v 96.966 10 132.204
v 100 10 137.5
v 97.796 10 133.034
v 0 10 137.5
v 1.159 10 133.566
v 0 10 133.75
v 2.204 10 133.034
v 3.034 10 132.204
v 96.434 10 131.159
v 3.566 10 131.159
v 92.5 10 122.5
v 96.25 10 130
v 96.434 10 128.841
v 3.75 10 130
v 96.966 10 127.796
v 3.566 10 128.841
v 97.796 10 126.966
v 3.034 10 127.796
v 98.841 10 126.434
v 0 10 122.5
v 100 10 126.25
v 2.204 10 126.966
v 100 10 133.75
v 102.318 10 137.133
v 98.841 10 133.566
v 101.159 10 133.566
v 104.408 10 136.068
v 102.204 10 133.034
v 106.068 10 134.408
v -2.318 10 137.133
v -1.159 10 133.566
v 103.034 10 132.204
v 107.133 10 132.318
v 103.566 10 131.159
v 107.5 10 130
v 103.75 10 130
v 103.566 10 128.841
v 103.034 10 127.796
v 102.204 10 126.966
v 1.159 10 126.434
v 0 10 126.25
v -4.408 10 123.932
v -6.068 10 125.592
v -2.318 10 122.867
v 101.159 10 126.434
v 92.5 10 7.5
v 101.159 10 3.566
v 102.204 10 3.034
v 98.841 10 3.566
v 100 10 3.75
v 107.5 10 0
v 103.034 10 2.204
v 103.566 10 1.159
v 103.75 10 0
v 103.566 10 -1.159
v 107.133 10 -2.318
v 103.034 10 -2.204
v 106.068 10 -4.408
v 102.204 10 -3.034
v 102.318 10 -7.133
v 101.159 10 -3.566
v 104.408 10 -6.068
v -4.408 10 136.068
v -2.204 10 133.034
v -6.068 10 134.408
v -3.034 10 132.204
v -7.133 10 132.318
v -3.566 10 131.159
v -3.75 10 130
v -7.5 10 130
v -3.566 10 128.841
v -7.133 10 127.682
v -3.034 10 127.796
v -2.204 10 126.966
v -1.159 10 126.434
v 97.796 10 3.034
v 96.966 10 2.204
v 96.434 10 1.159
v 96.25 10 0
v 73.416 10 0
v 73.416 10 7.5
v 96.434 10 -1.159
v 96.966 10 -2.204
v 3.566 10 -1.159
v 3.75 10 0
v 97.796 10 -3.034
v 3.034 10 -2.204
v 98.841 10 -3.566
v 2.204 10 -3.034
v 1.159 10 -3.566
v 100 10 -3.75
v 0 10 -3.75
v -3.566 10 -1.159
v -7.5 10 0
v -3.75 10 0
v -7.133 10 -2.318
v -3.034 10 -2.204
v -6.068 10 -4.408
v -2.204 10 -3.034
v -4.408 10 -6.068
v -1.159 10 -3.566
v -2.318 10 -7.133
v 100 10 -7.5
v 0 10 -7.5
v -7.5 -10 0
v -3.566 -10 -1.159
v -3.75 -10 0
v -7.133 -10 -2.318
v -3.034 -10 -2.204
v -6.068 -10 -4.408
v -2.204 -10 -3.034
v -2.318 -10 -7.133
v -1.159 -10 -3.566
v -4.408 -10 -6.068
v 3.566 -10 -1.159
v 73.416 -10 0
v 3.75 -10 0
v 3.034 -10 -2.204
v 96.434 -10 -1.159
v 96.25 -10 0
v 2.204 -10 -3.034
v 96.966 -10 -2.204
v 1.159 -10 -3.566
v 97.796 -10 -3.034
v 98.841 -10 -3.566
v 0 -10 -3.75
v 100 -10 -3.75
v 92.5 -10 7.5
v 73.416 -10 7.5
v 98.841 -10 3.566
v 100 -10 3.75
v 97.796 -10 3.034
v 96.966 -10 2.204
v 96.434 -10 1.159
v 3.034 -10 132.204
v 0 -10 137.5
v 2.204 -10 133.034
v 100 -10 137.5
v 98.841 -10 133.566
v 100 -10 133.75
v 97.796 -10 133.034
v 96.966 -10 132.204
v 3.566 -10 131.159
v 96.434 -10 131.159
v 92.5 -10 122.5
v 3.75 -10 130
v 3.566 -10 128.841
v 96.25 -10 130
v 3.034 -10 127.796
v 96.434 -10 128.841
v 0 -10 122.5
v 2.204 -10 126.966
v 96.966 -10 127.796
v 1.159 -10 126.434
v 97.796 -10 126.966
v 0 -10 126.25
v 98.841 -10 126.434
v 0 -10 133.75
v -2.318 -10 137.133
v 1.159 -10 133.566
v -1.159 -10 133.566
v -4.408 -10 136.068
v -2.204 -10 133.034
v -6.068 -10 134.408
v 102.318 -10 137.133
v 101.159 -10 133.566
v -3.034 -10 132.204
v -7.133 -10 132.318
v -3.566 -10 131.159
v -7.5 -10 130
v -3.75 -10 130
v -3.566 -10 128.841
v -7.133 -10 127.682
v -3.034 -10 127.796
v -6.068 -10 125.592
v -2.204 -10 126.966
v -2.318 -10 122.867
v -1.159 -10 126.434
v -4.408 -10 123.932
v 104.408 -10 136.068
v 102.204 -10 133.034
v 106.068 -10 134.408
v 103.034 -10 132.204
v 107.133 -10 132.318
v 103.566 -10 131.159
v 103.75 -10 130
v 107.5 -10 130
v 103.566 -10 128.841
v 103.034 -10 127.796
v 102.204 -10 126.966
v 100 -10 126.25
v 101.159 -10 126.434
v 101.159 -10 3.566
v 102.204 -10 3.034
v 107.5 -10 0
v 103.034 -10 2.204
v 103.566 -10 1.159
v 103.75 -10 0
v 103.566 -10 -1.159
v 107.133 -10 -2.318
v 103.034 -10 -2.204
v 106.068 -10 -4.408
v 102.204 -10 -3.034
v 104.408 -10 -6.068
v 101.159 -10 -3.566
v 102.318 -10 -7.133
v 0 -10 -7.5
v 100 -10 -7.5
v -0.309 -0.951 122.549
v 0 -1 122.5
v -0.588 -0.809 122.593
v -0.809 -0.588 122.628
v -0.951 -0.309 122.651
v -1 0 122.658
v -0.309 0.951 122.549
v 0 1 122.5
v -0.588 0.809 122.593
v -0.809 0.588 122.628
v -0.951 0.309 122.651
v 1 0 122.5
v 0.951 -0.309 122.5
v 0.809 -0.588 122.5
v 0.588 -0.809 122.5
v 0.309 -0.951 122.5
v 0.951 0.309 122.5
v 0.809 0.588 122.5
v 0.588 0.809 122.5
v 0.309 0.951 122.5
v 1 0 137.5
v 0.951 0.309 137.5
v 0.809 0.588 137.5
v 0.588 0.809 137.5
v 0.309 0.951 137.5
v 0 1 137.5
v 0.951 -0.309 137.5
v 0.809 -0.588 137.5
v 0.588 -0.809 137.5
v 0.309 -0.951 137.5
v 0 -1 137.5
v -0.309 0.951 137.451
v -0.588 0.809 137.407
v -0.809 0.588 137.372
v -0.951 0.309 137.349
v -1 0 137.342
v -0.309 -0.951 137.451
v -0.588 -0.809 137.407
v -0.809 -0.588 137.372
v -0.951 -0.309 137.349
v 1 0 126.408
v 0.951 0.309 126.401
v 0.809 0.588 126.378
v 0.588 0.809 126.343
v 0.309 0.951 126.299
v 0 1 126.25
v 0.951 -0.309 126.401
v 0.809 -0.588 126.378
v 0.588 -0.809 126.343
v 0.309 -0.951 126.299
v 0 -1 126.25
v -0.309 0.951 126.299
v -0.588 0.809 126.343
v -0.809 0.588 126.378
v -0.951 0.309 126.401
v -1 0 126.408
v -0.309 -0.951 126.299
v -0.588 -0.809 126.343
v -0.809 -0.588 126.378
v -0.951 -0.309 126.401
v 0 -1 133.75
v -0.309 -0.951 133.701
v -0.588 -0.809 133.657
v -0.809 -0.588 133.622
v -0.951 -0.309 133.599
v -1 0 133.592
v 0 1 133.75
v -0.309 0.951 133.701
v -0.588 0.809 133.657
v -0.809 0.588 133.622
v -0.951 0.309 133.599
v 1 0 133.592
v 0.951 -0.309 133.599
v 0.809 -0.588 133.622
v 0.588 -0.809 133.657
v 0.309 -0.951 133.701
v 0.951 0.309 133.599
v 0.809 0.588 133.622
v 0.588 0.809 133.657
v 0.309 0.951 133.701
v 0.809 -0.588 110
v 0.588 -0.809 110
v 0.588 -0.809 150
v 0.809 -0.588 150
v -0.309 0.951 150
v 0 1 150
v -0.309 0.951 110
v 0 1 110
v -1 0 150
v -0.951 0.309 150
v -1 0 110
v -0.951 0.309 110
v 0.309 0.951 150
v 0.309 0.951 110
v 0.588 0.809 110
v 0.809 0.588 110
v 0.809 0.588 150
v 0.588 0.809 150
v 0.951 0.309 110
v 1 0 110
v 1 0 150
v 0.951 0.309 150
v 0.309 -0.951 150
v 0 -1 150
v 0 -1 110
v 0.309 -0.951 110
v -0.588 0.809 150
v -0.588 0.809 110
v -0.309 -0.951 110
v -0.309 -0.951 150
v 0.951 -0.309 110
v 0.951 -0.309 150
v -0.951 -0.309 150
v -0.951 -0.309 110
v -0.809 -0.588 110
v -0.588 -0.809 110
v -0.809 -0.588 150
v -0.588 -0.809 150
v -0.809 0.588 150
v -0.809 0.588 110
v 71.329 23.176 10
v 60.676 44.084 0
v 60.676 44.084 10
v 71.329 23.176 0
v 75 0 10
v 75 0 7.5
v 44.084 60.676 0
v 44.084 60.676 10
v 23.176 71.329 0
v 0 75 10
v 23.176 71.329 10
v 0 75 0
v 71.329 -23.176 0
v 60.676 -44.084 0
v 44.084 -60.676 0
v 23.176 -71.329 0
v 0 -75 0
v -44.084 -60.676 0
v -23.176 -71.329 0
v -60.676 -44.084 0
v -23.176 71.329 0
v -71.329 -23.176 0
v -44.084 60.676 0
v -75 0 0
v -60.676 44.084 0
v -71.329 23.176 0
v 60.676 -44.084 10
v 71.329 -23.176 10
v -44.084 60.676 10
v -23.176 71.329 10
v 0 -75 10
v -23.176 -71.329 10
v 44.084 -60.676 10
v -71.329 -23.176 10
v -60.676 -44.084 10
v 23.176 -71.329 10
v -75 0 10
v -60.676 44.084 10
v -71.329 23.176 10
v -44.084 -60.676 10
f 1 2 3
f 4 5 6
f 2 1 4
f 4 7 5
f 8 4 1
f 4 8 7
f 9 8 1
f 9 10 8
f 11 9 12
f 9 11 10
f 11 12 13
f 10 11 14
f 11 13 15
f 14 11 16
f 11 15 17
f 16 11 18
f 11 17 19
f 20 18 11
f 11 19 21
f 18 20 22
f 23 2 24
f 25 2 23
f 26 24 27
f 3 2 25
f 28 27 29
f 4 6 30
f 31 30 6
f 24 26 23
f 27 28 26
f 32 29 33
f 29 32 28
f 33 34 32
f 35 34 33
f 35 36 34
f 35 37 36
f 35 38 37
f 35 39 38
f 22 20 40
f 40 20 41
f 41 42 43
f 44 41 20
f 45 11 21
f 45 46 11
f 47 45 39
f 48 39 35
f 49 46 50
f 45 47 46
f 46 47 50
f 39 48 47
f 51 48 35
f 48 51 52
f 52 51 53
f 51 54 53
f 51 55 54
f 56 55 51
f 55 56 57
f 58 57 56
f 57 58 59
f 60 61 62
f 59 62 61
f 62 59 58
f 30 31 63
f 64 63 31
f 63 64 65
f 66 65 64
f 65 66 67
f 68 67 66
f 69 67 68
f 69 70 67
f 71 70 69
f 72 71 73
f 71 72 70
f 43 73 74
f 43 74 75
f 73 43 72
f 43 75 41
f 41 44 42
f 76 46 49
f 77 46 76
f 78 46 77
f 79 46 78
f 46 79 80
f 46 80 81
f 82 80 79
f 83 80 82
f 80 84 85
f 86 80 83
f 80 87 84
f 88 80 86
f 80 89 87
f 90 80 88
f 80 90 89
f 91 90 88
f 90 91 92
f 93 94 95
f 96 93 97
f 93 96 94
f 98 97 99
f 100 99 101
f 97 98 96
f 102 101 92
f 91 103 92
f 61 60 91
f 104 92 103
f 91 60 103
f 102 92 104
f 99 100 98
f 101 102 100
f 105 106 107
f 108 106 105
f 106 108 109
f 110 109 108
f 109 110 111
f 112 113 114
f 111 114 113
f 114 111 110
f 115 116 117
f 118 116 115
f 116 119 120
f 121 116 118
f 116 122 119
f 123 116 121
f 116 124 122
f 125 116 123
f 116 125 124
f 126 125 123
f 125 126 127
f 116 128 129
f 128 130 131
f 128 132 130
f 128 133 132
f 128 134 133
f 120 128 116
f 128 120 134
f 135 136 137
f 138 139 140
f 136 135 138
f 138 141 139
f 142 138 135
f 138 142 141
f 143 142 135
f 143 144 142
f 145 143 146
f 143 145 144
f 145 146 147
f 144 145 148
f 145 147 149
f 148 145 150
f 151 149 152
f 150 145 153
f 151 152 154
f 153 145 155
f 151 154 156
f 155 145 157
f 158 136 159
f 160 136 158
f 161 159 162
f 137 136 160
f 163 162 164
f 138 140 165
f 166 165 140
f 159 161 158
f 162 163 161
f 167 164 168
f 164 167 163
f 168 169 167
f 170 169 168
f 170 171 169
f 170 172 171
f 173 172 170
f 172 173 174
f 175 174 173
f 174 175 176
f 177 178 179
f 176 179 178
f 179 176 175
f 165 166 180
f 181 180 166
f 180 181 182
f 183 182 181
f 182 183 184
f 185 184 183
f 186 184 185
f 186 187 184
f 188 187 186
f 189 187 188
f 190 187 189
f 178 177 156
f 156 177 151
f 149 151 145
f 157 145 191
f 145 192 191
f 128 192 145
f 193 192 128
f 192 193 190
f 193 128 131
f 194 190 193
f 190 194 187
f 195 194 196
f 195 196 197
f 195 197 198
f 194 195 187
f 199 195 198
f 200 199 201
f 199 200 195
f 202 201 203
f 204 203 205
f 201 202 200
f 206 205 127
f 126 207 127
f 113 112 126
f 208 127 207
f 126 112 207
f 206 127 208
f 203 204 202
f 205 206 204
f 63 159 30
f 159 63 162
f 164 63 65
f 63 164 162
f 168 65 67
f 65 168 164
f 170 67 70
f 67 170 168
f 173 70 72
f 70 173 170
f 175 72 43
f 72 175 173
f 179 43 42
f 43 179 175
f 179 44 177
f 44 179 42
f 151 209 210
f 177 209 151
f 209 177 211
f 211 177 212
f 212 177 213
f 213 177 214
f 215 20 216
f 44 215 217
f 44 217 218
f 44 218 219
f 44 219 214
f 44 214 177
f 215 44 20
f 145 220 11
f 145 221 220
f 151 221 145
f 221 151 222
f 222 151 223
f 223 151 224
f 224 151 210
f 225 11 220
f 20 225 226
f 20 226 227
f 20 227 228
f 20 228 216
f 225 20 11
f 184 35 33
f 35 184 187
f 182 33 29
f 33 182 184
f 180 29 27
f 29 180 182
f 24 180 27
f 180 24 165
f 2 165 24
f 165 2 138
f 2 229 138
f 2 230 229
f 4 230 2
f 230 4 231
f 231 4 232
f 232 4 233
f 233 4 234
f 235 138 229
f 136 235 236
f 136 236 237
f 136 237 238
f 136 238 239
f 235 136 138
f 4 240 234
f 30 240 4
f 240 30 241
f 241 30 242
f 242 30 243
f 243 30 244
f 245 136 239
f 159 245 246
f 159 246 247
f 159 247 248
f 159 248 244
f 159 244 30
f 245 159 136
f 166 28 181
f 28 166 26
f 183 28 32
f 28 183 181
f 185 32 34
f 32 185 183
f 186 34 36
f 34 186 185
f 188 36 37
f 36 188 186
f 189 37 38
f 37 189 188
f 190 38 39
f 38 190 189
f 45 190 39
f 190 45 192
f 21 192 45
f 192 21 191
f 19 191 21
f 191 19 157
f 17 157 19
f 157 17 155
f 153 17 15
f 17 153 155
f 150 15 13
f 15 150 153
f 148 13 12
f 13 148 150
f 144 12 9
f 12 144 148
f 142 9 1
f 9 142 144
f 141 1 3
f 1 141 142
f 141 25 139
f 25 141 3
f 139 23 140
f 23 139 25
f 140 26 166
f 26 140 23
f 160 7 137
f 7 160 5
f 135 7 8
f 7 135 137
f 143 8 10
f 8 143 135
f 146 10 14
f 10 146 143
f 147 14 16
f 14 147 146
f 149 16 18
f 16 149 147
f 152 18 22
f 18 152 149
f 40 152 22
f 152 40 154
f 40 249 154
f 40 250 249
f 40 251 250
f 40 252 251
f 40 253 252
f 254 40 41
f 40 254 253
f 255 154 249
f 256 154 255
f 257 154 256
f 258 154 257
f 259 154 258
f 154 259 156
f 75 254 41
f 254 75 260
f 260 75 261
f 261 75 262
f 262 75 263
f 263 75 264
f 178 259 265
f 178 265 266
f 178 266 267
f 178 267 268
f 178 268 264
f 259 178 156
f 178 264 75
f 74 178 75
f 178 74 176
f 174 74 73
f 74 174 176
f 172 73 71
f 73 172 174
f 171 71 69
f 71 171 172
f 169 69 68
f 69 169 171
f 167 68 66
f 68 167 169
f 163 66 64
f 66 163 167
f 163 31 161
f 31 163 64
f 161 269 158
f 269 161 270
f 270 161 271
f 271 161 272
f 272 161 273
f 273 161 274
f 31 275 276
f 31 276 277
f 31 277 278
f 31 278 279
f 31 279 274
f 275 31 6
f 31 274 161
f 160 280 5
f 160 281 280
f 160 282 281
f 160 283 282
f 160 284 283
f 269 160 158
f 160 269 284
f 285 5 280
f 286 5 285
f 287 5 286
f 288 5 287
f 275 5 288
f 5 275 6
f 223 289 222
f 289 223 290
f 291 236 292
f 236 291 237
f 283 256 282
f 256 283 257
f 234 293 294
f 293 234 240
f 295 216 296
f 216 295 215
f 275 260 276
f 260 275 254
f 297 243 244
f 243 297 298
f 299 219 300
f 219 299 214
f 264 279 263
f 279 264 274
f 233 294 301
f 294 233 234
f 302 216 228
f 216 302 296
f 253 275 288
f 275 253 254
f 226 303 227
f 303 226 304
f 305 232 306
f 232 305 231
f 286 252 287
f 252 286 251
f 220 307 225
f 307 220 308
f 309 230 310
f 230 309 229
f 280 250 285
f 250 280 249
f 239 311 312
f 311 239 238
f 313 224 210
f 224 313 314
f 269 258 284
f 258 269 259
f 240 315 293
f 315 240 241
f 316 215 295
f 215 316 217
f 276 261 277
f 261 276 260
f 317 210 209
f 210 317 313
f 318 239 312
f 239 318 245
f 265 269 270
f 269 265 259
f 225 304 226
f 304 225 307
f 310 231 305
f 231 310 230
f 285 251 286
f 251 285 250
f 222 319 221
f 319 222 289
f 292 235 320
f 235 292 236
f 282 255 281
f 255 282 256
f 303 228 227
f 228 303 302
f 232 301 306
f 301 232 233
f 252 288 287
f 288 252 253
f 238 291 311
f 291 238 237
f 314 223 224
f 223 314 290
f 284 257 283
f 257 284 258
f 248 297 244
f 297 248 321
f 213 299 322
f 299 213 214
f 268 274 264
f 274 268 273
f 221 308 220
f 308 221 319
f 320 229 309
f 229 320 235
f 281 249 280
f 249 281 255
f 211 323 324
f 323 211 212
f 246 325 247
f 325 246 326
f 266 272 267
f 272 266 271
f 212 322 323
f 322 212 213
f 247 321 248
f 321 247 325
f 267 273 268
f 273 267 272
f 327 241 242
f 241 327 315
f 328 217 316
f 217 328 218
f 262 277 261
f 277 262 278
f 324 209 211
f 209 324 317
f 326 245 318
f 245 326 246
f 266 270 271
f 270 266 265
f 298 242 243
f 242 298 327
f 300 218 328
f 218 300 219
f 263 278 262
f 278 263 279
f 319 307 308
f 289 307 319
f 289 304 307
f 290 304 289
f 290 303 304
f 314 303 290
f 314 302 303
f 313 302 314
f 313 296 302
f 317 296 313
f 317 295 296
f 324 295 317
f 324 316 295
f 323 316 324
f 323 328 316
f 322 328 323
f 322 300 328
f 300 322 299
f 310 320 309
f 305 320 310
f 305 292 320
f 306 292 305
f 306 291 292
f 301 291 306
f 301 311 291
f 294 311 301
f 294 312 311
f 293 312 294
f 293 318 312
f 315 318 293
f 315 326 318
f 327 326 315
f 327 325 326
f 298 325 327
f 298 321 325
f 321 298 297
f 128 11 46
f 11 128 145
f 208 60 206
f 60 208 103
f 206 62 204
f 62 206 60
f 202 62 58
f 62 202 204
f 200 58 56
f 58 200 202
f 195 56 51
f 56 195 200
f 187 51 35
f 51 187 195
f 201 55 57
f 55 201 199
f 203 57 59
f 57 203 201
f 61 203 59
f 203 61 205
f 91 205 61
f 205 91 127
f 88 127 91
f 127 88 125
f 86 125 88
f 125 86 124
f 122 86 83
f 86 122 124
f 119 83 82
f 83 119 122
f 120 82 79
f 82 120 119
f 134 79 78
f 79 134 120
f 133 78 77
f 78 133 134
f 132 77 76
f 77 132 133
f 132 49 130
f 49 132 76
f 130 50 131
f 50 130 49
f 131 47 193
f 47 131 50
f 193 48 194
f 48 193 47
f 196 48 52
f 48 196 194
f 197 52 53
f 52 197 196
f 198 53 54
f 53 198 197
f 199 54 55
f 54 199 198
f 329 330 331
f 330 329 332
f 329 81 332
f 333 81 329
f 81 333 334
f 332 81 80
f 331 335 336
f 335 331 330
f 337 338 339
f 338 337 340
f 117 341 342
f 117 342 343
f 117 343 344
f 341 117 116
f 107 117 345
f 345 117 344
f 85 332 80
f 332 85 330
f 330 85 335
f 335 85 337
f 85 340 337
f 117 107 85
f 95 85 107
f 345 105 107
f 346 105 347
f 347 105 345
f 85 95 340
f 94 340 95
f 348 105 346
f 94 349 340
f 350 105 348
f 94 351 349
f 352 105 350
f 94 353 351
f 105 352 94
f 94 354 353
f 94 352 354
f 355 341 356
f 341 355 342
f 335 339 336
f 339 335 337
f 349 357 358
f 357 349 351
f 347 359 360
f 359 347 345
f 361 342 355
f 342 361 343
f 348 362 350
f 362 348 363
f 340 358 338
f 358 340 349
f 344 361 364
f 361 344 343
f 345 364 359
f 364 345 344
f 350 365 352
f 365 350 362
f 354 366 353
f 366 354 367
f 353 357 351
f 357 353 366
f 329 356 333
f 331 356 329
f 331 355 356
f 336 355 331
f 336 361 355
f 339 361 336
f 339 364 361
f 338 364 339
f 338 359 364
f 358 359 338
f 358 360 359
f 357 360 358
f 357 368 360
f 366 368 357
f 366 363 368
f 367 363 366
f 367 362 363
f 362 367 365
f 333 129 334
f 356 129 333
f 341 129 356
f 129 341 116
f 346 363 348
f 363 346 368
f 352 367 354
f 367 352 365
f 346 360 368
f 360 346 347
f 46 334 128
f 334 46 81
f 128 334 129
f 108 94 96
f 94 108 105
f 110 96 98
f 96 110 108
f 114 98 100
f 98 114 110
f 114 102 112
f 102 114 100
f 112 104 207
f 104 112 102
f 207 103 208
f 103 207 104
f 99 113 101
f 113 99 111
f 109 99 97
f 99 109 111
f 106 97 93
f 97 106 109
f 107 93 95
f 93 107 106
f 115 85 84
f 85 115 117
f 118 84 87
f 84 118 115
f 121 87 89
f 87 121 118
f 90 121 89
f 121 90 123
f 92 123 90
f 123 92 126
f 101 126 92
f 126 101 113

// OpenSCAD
/* Evaluation tactSCAD */

/* Sensor solutions 
  Digikey pre-filtered search - https://www.digikey.de/short/4mrjv5qt
  IQS7221E001QFR - https://www.digikey.de/de/products/detail/azoteq-pty-ltd/IQS7221E001QFR/22155141
  */
$fn=20;

/*  [Dimensions]  */
armWdth=20;
armThck=15;
upperArmLen=130;
lowerArmLen=100;
tableDia=150;
tableThck=10;
shoulderLen=100;

/* [Control] */
upperArmRotation=90; //[0:180]
lowerArmRotation=90; //[0:180]
penRotation=0; //[-90:0:90]


/* [Hidden] */
penAutoRot=-upperArmRotation-lowerArmRotation;

r1=cos(upperArmRotation)*upperArmLen;

echo(r1);
color("red") translate([shoulderLen-r1,0,tableThck]) sphere(2);

//table
cylinder(d=tableDia,h=tableThck);

//shoulder
arm(shoulderLen);

//upperArm
translate([shoulderLen,0,0]) rotate([0,upperArmRotation+180,0]){
  arm(upperArmLen);
  //lowerArm
  translate([upperArmLen,0,0]) rotate([0,lowerArmRotation+180,0]){
    arm(lowerArmLen);
    //pen
    translate([lowerArmLen,0,0]) rotate([0,penAutoRot+penRotation,0]) color("darkRed") cylinder(d=2,h=40,center=true);
  }
}




*arm();
module arm(length=100,hasEnd=true,hasStart=true){
  bearingDims=[15,10,4];
  
  *rotate([90,0,0]) bearing(center=true);
  *magSens();
  
  //simple arm
  rotate([90,0,0]) linear_extrude(armWdth,center=true) difference(){
    hull(){
      circle(d=armThck);
      translate([length,0]) circle(d=armThck);
    }
    circle(d=armThck/2);
    translate([length,0]) circle(d=armThck/2);
  }
}

module bearing(do=15,di=10,h=4,center=false){
  zOffset= center ? -h/2 : 0;
  translate([0,0,zOffset])
    linear_extrude(h) difference(){
      circle(d=do);
      circle(d=di);
    }
}


module magSens(){
  rad=3;
  pcbDims=[18,15,1.6];
  holeDist=11.5;
  holeDia=2.7;
  chipDims=[5.1,4,1.75];
  
  //pcb
  color("darkgreen") linear_extrude(1.6) difference(){
    offset(rad) square([pcbDims.x-rad*2,pcbDims.y-rad*2],true);
    for (iy=[-1,1])
      translate([0,iy*holeDist/2]) circle(d=holeDia);
  }
  //chip
  color("darkslategrey") translate([0,0,pcbDims.z]) linear_extrude(chipDims.z) square([chipDims.x,chipDims.y],true);
  
}
